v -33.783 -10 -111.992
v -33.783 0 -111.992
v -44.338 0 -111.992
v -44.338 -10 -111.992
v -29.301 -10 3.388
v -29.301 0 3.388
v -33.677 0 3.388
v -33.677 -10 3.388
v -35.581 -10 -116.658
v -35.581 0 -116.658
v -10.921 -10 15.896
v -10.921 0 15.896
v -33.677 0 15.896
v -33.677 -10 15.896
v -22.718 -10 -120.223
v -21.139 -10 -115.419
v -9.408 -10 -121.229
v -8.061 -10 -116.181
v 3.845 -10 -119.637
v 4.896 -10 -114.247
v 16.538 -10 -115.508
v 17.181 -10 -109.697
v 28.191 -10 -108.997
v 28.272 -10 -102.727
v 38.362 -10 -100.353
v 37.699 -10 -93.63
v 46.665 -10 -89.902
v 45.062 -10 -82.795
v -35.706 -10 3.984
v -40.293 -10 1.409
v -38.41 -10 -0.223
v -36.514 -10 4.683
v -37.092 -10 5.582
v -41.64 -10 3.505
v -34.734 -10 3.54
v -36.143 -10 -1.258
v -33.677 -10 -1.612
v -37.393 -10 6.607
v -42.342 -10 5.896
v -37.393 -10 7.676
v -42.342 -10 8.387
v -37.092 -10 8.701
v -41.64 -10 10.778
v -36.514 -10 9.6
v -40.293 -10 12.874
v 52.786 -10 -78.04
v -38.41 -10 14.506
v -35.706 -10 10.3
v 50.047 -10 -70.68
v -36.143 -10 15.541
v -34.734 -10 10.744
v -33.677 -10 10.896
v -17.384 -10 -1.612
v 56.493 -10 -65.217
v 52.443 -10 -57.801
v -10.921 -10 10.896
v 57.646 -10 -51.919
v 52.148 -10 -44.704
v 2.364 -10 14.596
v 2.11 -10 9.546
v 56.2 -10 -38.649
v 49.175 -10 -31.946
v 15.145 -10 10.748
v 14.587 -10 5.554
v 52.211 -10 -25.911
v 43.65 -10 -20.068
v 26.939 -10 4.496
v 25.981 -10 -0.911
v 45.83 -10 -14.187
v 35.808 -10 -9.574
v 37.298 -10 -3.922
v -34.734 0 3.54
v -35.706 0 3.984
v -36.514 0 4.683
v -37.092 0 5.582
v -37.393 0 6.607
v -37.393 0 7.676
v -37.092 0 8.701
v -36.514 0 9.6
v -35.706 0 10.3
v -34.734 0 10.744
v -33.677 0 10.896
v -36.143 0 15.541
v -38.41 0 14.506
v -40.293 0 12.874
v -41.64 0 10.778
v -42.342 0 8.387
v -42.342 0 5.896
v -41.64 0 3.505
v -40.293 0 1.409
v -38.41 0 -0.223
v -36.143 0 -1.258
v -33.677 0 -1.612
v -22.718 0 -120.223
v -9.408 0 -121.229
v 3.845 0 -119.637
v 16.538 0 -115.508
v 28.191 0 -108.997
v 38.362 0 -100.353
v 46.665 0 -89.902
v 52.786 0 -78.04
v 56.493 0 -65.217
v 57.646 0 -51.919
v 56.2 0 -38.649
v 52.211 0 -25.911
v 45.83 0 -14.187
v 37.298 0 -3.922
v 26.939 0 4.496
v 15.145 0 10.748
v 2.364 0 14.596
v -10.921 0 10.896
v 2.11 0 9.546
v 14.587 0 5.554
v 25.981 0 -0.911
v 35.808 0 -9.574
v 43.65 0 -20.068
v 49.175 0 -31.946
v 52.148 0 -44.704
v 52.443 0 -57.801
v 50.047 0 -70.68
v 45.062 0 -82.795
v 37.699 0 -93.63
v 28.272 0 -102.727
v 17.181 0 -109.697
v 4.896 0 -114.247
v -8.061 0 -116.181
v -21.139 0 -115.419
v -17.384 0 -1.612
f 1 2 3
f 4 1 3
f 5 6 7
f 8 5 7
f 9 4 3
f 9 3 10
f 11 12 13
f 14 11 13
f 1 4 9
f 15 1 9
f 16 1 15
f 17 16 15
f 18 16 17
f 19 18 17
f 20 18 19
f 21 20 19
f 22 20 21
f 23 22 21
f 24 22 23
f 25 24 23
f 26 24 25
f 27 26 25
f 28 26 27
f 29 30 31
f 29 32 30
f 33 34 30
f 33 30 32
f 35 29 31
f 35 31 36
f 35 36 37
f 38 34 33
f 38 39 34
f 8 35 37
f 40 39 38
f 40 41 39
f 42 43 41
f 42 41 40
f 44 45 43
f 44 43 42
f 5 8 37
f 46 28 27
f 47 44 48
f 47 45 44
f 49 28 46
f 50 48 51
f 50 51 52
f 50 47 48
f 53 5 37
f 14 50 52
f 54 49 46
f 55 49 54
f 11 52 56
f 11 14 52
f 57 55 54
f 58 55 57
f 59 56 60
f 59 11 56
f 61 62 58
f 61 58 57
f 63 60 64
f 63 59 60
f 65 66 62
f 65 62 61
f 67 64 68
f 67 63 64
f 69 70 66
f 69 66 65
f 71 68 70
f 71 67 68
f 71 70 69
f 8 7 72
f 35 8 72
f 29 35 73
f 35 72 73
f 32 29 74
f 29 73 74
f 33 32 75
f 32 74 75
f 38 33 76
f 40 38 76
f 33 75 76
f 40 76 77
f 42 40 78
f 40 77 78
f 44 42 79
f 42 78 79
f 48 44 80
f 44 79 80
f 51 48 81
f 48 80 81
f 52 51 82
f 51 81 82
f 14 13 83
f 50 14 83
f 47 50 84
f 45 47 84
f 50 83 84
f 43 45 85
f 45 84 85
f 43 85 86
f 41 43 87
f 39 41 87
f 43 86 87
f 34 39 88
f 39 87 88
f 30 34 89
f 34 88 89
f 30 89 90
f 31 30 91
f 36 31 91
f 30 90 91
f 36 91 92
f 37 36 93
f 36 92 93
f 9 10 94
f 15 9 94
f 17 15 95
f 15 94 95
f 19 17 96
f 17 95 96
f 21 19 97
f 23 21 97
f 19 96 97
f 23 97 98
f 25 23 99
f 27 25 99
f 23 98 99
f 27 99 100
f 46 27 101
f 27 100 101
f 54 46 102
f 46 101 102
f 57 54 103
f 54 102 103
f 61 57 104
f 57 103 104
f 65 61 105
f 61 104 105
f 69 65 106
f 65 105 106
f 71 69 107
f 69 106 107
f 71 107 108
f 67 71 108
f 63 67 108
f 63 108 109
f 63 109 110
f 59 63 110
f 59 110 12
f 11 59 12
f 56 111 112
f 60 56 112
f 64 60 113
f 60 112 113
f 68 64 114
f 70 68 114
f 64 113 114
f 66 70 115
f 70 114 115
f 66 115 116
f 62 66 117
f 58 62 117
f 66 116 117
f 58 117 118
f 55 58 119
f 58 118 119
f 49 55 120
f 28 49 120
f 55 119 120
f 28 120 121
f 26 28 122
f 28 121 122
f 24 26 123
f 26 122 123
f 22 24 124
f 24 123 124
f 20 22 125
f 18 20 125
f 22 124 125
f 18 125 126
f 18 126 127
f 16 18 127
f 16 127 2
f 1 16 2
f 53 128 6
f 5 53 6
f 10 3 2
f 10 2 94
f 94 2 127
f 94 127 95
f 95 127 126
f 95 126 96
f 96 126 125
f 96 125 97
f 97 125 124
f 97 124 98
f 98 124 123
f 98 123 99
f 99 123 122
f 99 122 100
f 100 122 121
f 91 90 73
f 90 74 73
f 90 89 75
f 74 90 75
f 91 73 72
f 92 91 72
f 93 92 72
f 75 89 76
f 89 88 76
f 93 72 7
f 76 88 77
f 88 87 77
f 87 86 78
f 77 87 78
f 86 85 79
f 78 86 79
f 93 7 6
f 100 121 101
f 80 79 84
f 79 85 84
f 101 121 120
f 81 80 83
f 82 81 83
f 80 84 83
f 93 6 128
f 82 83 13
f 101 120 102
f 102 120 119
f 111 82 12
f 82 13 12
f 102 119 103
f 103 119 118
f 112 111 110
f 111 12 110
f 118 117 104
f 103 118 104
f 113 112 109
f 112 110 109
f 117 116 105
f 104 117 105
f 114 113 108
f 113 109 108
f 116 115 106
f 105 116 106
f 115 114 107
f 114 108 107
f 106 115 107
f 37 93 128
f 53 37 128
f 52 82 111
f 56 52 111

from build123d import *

# Parameters (mm, degrees)
F1_DEPTH = 10


with BuildPart() as f1:
    # F0 (on Front) → F1 (new body)
    with BuildSketch(Plane.XZ):
        with BuildLine():
            ThreePointArc((-35.581168, -116.657823), (56.493287, -65.216884), (-10.920648, 15.895611))
            Line((-10.920648, 15.895611), (-33.676889, 15.895611))
            ThreePointArc((-33.676889, 15.895611), (-42.430831, 7.141669), (-33.676889, -1.612273))
            Line((-33.676889, -1.612273), (-29.301442, -1.612273))
            Line((-29.301442, -1.612273), (-17.38406, -1.612273))
            Line((-17.38406, -1.612273), (-29.301442, 3.387727))
            Line((-29.301442, 3.387727), (-33.676889, 3.387727))
            ThreePointArc((-33.676889, 3.387727), (-37.430831, 7.141669), (-33.676889, 10.895611))
            Line((-33.676889, 10.895611), (-10.920648, 10.895611))
            ThreePointArc((-10.920648, 10.895611), (51.577633, -64.302366), (-33.782985, -111.992361))
            Line((-33.782985, -111.992361), (-44.337623, -111.992361))
            Line((-44.337623, -111.992361), (-35.581168, -116.657823))
        make_face()
    extrude(amount=F1_DEPTH)


solid = f1.part
